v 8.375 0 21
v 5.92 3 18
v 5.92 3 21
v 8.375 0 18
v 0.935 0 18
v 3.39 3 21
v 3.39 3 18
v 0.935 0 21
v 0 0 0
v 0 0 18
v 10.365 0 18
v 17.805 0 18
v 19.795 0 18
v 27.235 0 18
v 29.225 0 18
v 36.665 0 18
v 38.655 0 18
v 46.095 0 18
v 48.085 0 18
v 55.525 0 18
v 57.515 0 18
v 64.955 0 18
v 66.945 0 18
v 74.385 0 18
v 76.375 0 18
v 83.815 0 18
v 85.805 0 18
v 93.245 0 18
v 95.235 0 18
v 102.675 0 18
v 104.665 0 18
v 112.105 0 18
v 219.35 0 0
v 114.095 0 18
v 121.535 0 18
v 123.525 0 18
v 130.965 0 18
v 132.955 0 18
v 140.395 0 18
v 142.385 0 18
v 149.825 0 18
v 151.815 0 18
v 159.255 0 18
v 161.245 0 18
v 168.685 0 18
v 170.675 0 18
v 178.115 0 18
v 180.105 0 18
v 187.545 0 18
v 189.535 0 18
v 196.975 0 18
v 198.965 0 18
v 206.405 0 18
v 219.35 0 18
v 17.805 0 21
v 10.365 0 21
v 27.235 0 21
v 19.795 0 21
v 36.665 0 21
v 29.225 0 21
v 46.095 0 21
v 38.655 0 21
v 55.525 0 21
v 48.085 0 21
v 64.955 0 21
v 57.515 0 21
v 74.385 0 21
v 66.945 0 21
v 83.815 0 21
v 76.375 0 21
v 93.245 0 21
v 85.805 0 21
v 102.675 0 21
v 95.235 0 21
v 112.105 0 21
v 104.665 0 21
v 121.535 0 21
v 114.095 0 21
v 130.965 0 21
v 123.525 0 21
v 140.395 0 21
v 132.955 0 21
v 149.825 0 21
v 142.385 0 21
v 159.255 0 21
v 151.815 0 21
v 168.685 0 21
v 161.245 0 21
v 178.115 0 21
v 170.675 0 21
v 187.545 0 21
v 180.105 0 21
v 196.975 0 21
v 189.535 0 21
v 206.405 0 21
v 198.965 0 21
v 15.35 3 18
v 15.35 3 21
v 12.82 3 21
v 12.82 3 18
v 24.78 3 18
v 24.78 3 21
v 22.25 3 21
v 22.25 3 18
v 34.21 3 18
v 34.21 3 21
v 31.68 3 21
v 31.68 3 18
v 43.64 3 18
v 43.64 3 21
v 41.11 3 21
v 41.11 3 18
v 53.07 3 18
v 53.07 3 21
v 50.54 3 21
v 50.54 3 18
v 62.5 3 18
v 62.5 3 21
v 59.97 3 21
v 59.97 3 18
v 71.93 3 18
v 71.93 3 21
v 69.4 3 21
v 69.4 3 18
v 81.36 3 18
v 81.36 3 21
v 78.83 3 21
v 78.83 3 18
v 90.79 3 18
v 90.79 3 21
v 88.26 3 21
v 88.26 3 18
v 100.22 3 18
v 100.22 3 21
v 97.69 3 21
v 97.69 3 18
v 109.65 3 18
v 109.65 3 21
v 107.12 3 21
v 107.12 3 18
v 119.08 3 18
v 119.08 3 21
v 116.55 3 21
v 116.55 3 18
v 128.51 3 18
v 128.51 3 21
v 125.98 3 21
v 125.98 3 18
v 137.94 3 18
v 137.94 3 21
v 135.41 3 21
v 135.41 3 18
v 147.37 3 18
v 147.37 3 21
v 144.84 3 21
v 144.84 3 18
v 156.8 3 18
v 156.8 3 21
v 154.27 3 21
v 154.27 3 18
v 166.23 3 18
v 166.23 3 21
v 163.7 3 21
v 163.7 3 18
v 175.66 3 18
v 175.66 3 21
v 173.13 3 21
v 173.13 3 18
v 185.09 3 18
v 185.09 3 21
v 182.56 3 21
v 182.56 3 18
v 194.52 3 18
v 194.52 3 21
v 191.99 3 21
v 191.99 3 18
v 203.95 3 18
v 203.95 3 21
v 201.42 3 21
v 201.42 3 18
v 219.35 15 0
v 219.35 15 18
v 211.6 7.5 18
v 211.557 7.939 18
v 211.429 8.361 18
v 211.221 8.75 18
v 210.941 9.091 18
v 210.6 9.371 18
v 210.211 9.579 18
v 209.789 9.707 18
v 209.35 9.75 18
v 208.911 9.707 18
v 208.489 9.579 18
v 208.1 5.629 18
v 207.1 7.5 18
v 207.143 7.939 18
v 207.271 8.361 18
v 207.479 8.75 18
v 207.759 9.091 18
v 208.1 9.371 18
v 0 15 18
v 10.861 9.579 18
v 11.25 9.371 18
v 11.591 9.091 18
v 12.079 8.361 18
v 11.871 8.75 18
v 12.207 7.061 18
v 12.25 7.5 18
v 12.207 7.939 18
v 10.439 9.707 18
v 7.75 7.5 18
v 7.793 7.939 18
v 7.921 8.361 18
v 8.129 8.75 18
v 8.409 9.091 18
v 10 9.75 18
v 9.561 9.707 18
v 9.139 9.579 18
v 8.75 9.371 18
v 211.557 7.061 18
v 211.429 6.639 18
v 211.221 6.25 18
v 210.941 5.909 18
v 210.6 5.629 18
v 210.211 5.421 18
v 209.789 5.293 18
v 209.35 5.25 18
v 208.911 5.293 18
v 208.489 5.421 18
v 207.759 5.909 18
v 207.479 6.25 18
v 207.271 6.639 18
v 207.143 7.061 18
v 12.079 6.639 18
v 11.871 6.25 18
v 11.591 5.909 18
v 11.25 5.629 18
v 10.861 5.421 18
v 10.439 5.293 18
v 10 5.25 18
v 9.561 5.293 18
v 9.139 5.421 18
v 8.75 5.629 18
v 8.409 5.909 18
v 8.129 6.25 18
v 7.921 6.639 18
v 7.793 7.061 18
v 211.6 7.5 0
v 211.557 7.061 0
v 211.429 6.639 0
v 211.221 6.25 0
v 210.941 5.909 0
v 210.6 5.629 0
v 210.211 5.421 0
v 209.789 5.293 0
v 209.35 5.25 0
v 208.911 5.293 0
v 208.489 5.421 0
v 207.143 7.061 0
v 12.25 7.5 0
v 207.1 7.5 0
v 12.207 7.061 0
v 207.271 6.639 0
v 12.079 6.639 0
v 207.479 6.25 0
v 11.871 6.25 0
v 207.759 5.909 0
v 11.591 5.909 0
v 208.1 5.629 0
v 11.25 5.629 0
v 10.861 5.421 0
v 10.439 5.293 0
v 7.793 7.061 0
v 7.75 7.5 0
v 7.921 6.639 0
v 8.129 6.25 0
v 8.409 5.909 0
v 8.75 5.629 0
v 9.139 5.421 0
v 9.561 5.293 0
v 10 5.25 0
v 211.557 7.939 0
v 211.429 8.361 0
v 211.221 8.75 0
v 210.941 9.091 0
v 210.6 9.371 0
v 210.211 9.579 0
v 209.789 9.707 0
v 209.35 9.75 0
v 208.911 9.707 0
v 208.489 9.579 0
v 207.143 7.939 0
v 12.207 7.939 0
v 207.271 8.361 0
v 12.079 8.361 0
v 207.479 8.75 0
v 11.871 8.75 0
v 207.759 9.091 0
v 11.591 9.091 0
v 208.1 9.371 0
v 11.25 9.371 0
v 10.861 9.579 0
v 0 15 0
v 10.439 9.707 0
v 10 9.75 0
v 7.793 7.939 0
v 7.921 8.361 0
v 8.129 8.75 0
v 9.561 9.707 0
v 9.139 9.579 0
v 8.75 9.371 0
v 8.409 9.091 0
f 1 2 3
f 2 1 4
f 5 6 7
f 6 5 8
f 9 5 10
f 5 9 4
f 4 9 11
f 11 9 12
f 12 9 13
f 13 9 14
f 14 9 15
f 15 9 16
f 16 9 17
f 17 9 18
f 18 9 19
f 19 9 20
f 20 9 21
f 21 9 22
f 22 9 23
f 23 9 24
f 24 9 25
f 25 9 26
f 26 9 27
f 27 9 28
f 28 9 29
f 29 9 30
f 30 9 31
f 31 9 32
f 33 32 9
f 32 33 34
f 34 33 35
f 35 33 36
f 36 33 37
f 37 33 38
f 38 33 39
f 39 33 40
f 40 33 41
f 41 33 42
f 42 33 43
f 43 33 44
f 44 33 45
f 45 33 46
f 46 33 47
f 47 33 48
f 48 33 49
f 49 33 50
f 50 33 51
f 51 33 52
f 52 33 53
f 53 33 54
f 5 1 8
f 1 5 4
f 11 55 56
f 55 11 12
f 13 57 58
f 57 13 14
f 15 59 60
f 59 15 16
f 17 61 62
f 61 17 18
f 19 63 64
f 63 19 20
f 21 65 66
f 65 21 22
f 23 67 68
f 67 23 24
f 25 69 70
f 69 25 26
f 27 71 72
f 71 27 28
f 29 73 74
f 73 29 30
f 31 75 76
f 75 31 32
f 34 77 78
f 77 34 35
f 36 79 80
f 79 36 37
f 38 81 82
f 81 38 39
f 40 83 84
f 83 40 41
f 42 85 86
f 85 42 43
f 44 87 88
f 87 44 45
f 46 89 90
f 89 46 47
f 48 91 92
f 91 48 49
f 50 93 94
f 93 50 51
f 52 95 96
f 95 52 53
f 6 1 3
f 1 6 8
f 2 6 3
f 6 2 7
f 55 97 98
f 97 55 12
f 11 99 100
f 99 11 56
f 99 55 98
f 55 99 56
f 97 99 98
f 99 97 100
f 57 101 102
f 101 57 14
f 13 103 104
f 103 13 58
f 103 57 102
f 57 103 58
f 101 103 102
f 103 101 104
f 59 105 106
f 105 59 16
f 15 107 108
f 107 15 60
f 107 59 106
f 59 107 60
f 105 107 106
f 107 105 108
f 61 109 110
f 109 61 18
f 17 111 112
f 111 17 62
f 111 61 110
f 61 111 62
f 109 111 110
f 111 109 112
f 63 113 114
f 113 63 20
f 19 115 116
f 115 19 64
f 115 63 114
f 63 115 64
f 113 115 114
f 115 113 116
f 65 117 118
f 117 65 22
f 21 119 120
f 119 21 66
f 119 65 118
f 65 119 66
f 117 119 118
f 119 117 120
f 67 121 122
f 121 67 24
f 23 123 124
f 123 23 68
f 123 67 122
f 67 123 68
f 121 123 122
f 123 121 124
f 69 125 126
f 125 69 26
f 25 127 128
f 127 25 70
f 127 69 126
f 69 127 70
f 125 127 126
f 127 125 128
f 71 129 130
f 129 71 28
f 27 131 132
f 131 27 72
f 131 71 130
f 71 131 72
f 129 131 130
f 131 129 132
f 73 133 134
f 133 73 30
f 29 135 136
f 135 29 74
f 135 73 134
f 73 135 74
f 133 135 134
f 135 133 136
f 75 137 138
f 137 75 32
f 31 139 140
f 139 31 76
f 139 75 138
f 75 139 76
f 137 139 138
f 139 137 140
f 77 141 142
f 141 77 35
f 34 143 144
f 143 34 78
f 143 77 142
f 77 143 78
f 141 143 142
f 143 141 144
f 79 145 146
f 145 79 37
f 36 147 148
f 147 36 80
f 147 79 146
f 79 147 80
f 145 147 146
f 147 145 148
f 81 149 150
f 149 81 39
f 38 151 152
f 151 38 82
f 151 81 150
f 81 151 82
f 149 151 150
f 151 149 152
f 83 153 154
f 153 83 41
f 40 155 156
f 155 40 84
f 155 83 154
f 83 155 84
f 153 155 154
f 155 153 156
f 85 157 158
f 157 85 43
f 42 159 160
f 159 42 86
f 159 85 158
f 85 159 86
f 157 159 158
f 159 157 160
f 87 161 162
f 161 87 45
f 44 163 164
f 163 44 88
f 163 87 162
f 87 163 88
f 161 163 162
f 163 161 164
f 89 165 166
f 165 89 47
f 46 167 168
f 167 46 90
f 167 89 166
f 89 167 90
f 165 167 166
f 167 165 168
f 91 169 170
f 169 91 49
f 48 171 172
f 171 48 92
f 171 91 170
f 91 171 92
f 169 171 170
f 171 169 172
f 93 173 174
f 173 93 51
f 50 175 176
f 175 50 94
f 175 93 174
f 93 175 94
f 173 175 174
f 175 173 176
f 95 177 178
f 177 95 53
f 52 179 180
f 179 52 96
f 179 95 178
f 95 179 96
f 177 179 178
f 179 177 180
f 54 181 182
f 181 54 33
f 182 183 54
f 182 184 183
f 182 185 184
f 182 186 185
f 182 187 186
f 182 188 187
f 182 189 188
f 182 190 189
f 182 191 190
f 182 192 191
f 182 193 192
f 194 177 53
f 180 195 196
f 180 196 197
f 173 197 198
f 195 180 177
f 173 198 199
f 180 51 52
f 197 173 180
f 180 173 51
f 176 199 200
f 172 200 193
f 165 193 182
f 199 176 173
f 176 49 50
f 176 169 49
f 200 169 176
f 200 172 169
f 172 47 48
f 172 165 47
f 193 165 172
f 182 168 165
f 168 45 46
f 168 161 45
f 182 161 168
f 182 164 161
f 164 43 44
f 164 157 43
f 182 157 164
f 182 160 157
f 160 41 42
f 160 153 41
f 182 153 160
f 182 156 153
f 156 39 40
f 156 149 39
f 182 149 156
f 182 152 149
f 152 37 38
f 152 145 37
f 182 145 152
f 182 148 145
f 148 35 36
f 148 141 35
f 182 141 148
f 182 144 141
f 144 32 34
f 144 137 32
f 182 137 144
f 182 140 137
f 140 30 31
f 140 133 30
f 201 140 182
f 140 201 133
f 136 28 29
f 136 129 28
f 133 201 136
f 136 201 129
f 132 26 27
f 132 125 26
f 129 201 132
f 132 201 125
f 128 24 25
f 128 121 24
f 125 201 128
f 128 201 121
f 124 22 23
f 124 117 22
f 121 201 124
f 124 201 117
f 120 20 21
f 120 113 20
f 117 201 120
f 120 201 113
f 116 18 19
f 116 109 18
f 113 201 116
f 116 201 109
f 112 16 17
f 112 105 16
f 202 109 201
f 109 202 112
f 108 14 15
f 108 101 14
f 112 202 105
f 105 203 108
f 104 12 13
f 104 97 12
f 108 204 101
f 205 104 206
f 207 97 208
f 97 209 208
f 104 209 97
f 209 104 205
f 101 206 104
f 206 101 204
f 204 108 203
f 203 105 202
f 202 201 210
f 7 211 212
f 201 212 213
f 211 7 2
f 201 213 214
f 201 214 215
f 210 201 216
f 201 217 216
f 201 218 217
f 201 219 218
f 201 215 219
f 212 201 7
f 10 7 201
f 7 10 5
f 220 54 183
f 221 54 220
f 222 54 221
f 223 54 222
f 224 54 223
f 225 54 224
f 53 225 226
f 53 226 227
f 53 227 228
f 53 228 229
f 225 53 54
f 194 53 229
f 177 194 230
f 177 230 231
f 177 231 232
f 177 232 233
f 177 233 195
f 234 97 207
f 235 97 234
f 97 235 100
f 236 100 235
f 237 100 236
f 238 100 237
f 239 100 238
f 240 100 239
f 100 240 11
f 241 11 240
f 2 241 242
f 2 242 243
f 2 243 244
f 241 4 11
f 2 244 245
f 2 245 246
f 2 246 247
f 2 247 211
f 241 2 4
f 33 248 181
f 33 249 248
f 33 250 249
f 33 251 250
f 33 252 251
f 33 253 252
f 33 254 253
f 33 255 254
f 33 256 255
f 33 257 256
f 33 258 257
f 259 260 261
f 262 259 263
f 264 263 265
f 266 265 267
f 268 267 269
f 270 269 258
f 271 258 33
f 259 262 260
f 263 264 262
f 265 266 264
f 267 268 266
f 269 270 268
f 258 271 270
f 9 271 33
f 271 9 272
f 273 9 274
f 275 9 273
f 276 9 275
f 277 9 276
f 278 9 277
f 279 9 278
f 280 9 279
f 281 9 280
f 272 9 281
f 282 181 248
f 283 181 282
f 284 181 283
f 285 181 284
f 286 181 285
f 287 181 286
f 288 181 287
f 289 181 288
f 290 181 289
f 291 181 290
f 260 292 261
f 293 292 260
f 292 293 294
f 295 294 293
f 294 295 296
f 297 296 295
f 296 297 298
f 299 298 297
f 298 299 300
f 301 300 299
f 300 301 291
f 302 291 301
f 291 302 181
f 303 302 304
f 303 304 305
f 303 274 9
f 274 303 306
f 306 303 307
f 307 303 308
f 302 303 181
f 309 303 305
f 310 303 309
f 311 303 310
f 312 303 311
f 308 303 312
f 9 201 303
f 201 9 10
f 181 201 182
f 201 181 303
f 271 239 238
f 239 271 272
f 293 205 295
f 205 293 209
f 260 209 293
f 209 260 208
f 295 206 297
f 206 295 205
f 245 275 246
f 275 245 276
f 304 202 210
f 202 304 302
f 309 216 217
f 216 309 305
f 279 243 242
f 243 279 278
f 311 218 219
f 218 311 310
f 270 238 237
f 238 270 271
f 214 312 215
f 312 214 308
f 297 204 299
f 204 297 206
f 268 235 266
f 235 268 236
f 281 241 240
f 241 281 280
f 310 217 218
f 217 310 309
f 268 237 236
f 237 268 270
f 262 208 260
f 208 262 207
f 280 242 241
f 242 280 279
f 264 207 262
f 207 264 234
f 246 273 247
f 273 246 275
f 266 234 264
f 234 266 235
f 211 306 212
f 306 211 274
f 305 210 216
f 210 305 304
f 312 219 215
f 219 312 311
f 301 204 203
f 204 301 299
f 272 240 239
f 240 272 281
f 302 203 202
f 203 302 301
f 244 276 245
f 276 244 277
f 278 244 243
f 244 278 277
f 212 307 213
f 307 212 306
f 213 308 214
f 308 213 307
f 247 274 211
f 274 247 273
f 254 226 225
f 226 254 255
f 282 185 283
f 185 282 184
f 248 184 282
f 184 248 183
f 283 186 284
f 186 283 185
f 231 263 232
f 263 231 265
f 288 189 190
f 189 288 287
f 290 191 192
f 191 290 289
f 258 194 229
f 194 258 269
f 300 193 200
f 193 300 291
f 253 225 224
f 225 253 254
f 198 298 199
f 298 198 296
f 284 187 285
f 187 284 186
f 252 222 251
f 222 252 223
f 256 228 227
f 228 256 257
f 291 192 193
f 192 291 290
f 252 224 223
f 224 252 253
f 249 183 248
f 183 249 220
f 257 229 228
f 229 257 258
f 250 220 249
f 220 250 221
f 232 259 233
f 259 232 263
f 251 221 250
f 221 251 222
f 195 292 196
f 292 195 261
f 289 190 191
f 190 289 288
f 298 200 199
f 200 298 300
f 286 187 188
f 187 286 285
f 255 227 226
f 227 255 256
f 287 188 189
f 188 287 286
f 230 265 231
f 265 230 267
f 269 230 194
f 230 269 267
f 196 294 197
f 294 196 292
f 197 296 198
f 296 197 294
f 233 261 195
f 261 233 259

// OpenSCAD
$fn = 32;

// ----------------------------------------------------------------------
// Gear rack: m=3 z=22, 219.35 x 15 x 21 mm
// ----------------------------------------------------------------------

// --- parameters (mm) ---
rack_len = 219.35;        // rack length, X
rack_w = 15;              // rack width, Y
rack_h = 21;              // overall height, Z
modul = 3;                // module
body_t = 18;              // tooth root line height
pitch = 9.43;             // circular pitch
tip_w = 2.53;             // tooth thickness at the tip
root_w = 7.44;            // tooth thickness at the root line
hole_d = 4.5;             // mounting hole
sink = 0.6;               // tooth root overlap into the body

tooth_span = 207.34;

module tooth(x0) {
  /* 20 deg flank profile, sunk into the body for a positive overlap */
  translate([x0, 0, body_t - sink])
    linear_extrude(height = rack_h - body_t + sink)
      polygon(points = [[-root_w / 2, 0], [root_w / 2, 0],
                        [tip_w / 2, rack_h - body_t],
                        [-tip_w / 2, rack_h - body_t]]);
}

difference() {
  union() {
    cube([rack_len, rack_w, body_t]);
    for (i = [0 : 22 - 1])
      tooth((i + 0.5) * pitch + (tooth_span - 22 * pitch) / 2);
  }
  translate([10, 7.5, -1]) cylinder(h = body_t + 2, d = hole_d);
  translate([209.35, 7.5, -1]) cylinder(h = body_t + 2, d = hole_d);
}
